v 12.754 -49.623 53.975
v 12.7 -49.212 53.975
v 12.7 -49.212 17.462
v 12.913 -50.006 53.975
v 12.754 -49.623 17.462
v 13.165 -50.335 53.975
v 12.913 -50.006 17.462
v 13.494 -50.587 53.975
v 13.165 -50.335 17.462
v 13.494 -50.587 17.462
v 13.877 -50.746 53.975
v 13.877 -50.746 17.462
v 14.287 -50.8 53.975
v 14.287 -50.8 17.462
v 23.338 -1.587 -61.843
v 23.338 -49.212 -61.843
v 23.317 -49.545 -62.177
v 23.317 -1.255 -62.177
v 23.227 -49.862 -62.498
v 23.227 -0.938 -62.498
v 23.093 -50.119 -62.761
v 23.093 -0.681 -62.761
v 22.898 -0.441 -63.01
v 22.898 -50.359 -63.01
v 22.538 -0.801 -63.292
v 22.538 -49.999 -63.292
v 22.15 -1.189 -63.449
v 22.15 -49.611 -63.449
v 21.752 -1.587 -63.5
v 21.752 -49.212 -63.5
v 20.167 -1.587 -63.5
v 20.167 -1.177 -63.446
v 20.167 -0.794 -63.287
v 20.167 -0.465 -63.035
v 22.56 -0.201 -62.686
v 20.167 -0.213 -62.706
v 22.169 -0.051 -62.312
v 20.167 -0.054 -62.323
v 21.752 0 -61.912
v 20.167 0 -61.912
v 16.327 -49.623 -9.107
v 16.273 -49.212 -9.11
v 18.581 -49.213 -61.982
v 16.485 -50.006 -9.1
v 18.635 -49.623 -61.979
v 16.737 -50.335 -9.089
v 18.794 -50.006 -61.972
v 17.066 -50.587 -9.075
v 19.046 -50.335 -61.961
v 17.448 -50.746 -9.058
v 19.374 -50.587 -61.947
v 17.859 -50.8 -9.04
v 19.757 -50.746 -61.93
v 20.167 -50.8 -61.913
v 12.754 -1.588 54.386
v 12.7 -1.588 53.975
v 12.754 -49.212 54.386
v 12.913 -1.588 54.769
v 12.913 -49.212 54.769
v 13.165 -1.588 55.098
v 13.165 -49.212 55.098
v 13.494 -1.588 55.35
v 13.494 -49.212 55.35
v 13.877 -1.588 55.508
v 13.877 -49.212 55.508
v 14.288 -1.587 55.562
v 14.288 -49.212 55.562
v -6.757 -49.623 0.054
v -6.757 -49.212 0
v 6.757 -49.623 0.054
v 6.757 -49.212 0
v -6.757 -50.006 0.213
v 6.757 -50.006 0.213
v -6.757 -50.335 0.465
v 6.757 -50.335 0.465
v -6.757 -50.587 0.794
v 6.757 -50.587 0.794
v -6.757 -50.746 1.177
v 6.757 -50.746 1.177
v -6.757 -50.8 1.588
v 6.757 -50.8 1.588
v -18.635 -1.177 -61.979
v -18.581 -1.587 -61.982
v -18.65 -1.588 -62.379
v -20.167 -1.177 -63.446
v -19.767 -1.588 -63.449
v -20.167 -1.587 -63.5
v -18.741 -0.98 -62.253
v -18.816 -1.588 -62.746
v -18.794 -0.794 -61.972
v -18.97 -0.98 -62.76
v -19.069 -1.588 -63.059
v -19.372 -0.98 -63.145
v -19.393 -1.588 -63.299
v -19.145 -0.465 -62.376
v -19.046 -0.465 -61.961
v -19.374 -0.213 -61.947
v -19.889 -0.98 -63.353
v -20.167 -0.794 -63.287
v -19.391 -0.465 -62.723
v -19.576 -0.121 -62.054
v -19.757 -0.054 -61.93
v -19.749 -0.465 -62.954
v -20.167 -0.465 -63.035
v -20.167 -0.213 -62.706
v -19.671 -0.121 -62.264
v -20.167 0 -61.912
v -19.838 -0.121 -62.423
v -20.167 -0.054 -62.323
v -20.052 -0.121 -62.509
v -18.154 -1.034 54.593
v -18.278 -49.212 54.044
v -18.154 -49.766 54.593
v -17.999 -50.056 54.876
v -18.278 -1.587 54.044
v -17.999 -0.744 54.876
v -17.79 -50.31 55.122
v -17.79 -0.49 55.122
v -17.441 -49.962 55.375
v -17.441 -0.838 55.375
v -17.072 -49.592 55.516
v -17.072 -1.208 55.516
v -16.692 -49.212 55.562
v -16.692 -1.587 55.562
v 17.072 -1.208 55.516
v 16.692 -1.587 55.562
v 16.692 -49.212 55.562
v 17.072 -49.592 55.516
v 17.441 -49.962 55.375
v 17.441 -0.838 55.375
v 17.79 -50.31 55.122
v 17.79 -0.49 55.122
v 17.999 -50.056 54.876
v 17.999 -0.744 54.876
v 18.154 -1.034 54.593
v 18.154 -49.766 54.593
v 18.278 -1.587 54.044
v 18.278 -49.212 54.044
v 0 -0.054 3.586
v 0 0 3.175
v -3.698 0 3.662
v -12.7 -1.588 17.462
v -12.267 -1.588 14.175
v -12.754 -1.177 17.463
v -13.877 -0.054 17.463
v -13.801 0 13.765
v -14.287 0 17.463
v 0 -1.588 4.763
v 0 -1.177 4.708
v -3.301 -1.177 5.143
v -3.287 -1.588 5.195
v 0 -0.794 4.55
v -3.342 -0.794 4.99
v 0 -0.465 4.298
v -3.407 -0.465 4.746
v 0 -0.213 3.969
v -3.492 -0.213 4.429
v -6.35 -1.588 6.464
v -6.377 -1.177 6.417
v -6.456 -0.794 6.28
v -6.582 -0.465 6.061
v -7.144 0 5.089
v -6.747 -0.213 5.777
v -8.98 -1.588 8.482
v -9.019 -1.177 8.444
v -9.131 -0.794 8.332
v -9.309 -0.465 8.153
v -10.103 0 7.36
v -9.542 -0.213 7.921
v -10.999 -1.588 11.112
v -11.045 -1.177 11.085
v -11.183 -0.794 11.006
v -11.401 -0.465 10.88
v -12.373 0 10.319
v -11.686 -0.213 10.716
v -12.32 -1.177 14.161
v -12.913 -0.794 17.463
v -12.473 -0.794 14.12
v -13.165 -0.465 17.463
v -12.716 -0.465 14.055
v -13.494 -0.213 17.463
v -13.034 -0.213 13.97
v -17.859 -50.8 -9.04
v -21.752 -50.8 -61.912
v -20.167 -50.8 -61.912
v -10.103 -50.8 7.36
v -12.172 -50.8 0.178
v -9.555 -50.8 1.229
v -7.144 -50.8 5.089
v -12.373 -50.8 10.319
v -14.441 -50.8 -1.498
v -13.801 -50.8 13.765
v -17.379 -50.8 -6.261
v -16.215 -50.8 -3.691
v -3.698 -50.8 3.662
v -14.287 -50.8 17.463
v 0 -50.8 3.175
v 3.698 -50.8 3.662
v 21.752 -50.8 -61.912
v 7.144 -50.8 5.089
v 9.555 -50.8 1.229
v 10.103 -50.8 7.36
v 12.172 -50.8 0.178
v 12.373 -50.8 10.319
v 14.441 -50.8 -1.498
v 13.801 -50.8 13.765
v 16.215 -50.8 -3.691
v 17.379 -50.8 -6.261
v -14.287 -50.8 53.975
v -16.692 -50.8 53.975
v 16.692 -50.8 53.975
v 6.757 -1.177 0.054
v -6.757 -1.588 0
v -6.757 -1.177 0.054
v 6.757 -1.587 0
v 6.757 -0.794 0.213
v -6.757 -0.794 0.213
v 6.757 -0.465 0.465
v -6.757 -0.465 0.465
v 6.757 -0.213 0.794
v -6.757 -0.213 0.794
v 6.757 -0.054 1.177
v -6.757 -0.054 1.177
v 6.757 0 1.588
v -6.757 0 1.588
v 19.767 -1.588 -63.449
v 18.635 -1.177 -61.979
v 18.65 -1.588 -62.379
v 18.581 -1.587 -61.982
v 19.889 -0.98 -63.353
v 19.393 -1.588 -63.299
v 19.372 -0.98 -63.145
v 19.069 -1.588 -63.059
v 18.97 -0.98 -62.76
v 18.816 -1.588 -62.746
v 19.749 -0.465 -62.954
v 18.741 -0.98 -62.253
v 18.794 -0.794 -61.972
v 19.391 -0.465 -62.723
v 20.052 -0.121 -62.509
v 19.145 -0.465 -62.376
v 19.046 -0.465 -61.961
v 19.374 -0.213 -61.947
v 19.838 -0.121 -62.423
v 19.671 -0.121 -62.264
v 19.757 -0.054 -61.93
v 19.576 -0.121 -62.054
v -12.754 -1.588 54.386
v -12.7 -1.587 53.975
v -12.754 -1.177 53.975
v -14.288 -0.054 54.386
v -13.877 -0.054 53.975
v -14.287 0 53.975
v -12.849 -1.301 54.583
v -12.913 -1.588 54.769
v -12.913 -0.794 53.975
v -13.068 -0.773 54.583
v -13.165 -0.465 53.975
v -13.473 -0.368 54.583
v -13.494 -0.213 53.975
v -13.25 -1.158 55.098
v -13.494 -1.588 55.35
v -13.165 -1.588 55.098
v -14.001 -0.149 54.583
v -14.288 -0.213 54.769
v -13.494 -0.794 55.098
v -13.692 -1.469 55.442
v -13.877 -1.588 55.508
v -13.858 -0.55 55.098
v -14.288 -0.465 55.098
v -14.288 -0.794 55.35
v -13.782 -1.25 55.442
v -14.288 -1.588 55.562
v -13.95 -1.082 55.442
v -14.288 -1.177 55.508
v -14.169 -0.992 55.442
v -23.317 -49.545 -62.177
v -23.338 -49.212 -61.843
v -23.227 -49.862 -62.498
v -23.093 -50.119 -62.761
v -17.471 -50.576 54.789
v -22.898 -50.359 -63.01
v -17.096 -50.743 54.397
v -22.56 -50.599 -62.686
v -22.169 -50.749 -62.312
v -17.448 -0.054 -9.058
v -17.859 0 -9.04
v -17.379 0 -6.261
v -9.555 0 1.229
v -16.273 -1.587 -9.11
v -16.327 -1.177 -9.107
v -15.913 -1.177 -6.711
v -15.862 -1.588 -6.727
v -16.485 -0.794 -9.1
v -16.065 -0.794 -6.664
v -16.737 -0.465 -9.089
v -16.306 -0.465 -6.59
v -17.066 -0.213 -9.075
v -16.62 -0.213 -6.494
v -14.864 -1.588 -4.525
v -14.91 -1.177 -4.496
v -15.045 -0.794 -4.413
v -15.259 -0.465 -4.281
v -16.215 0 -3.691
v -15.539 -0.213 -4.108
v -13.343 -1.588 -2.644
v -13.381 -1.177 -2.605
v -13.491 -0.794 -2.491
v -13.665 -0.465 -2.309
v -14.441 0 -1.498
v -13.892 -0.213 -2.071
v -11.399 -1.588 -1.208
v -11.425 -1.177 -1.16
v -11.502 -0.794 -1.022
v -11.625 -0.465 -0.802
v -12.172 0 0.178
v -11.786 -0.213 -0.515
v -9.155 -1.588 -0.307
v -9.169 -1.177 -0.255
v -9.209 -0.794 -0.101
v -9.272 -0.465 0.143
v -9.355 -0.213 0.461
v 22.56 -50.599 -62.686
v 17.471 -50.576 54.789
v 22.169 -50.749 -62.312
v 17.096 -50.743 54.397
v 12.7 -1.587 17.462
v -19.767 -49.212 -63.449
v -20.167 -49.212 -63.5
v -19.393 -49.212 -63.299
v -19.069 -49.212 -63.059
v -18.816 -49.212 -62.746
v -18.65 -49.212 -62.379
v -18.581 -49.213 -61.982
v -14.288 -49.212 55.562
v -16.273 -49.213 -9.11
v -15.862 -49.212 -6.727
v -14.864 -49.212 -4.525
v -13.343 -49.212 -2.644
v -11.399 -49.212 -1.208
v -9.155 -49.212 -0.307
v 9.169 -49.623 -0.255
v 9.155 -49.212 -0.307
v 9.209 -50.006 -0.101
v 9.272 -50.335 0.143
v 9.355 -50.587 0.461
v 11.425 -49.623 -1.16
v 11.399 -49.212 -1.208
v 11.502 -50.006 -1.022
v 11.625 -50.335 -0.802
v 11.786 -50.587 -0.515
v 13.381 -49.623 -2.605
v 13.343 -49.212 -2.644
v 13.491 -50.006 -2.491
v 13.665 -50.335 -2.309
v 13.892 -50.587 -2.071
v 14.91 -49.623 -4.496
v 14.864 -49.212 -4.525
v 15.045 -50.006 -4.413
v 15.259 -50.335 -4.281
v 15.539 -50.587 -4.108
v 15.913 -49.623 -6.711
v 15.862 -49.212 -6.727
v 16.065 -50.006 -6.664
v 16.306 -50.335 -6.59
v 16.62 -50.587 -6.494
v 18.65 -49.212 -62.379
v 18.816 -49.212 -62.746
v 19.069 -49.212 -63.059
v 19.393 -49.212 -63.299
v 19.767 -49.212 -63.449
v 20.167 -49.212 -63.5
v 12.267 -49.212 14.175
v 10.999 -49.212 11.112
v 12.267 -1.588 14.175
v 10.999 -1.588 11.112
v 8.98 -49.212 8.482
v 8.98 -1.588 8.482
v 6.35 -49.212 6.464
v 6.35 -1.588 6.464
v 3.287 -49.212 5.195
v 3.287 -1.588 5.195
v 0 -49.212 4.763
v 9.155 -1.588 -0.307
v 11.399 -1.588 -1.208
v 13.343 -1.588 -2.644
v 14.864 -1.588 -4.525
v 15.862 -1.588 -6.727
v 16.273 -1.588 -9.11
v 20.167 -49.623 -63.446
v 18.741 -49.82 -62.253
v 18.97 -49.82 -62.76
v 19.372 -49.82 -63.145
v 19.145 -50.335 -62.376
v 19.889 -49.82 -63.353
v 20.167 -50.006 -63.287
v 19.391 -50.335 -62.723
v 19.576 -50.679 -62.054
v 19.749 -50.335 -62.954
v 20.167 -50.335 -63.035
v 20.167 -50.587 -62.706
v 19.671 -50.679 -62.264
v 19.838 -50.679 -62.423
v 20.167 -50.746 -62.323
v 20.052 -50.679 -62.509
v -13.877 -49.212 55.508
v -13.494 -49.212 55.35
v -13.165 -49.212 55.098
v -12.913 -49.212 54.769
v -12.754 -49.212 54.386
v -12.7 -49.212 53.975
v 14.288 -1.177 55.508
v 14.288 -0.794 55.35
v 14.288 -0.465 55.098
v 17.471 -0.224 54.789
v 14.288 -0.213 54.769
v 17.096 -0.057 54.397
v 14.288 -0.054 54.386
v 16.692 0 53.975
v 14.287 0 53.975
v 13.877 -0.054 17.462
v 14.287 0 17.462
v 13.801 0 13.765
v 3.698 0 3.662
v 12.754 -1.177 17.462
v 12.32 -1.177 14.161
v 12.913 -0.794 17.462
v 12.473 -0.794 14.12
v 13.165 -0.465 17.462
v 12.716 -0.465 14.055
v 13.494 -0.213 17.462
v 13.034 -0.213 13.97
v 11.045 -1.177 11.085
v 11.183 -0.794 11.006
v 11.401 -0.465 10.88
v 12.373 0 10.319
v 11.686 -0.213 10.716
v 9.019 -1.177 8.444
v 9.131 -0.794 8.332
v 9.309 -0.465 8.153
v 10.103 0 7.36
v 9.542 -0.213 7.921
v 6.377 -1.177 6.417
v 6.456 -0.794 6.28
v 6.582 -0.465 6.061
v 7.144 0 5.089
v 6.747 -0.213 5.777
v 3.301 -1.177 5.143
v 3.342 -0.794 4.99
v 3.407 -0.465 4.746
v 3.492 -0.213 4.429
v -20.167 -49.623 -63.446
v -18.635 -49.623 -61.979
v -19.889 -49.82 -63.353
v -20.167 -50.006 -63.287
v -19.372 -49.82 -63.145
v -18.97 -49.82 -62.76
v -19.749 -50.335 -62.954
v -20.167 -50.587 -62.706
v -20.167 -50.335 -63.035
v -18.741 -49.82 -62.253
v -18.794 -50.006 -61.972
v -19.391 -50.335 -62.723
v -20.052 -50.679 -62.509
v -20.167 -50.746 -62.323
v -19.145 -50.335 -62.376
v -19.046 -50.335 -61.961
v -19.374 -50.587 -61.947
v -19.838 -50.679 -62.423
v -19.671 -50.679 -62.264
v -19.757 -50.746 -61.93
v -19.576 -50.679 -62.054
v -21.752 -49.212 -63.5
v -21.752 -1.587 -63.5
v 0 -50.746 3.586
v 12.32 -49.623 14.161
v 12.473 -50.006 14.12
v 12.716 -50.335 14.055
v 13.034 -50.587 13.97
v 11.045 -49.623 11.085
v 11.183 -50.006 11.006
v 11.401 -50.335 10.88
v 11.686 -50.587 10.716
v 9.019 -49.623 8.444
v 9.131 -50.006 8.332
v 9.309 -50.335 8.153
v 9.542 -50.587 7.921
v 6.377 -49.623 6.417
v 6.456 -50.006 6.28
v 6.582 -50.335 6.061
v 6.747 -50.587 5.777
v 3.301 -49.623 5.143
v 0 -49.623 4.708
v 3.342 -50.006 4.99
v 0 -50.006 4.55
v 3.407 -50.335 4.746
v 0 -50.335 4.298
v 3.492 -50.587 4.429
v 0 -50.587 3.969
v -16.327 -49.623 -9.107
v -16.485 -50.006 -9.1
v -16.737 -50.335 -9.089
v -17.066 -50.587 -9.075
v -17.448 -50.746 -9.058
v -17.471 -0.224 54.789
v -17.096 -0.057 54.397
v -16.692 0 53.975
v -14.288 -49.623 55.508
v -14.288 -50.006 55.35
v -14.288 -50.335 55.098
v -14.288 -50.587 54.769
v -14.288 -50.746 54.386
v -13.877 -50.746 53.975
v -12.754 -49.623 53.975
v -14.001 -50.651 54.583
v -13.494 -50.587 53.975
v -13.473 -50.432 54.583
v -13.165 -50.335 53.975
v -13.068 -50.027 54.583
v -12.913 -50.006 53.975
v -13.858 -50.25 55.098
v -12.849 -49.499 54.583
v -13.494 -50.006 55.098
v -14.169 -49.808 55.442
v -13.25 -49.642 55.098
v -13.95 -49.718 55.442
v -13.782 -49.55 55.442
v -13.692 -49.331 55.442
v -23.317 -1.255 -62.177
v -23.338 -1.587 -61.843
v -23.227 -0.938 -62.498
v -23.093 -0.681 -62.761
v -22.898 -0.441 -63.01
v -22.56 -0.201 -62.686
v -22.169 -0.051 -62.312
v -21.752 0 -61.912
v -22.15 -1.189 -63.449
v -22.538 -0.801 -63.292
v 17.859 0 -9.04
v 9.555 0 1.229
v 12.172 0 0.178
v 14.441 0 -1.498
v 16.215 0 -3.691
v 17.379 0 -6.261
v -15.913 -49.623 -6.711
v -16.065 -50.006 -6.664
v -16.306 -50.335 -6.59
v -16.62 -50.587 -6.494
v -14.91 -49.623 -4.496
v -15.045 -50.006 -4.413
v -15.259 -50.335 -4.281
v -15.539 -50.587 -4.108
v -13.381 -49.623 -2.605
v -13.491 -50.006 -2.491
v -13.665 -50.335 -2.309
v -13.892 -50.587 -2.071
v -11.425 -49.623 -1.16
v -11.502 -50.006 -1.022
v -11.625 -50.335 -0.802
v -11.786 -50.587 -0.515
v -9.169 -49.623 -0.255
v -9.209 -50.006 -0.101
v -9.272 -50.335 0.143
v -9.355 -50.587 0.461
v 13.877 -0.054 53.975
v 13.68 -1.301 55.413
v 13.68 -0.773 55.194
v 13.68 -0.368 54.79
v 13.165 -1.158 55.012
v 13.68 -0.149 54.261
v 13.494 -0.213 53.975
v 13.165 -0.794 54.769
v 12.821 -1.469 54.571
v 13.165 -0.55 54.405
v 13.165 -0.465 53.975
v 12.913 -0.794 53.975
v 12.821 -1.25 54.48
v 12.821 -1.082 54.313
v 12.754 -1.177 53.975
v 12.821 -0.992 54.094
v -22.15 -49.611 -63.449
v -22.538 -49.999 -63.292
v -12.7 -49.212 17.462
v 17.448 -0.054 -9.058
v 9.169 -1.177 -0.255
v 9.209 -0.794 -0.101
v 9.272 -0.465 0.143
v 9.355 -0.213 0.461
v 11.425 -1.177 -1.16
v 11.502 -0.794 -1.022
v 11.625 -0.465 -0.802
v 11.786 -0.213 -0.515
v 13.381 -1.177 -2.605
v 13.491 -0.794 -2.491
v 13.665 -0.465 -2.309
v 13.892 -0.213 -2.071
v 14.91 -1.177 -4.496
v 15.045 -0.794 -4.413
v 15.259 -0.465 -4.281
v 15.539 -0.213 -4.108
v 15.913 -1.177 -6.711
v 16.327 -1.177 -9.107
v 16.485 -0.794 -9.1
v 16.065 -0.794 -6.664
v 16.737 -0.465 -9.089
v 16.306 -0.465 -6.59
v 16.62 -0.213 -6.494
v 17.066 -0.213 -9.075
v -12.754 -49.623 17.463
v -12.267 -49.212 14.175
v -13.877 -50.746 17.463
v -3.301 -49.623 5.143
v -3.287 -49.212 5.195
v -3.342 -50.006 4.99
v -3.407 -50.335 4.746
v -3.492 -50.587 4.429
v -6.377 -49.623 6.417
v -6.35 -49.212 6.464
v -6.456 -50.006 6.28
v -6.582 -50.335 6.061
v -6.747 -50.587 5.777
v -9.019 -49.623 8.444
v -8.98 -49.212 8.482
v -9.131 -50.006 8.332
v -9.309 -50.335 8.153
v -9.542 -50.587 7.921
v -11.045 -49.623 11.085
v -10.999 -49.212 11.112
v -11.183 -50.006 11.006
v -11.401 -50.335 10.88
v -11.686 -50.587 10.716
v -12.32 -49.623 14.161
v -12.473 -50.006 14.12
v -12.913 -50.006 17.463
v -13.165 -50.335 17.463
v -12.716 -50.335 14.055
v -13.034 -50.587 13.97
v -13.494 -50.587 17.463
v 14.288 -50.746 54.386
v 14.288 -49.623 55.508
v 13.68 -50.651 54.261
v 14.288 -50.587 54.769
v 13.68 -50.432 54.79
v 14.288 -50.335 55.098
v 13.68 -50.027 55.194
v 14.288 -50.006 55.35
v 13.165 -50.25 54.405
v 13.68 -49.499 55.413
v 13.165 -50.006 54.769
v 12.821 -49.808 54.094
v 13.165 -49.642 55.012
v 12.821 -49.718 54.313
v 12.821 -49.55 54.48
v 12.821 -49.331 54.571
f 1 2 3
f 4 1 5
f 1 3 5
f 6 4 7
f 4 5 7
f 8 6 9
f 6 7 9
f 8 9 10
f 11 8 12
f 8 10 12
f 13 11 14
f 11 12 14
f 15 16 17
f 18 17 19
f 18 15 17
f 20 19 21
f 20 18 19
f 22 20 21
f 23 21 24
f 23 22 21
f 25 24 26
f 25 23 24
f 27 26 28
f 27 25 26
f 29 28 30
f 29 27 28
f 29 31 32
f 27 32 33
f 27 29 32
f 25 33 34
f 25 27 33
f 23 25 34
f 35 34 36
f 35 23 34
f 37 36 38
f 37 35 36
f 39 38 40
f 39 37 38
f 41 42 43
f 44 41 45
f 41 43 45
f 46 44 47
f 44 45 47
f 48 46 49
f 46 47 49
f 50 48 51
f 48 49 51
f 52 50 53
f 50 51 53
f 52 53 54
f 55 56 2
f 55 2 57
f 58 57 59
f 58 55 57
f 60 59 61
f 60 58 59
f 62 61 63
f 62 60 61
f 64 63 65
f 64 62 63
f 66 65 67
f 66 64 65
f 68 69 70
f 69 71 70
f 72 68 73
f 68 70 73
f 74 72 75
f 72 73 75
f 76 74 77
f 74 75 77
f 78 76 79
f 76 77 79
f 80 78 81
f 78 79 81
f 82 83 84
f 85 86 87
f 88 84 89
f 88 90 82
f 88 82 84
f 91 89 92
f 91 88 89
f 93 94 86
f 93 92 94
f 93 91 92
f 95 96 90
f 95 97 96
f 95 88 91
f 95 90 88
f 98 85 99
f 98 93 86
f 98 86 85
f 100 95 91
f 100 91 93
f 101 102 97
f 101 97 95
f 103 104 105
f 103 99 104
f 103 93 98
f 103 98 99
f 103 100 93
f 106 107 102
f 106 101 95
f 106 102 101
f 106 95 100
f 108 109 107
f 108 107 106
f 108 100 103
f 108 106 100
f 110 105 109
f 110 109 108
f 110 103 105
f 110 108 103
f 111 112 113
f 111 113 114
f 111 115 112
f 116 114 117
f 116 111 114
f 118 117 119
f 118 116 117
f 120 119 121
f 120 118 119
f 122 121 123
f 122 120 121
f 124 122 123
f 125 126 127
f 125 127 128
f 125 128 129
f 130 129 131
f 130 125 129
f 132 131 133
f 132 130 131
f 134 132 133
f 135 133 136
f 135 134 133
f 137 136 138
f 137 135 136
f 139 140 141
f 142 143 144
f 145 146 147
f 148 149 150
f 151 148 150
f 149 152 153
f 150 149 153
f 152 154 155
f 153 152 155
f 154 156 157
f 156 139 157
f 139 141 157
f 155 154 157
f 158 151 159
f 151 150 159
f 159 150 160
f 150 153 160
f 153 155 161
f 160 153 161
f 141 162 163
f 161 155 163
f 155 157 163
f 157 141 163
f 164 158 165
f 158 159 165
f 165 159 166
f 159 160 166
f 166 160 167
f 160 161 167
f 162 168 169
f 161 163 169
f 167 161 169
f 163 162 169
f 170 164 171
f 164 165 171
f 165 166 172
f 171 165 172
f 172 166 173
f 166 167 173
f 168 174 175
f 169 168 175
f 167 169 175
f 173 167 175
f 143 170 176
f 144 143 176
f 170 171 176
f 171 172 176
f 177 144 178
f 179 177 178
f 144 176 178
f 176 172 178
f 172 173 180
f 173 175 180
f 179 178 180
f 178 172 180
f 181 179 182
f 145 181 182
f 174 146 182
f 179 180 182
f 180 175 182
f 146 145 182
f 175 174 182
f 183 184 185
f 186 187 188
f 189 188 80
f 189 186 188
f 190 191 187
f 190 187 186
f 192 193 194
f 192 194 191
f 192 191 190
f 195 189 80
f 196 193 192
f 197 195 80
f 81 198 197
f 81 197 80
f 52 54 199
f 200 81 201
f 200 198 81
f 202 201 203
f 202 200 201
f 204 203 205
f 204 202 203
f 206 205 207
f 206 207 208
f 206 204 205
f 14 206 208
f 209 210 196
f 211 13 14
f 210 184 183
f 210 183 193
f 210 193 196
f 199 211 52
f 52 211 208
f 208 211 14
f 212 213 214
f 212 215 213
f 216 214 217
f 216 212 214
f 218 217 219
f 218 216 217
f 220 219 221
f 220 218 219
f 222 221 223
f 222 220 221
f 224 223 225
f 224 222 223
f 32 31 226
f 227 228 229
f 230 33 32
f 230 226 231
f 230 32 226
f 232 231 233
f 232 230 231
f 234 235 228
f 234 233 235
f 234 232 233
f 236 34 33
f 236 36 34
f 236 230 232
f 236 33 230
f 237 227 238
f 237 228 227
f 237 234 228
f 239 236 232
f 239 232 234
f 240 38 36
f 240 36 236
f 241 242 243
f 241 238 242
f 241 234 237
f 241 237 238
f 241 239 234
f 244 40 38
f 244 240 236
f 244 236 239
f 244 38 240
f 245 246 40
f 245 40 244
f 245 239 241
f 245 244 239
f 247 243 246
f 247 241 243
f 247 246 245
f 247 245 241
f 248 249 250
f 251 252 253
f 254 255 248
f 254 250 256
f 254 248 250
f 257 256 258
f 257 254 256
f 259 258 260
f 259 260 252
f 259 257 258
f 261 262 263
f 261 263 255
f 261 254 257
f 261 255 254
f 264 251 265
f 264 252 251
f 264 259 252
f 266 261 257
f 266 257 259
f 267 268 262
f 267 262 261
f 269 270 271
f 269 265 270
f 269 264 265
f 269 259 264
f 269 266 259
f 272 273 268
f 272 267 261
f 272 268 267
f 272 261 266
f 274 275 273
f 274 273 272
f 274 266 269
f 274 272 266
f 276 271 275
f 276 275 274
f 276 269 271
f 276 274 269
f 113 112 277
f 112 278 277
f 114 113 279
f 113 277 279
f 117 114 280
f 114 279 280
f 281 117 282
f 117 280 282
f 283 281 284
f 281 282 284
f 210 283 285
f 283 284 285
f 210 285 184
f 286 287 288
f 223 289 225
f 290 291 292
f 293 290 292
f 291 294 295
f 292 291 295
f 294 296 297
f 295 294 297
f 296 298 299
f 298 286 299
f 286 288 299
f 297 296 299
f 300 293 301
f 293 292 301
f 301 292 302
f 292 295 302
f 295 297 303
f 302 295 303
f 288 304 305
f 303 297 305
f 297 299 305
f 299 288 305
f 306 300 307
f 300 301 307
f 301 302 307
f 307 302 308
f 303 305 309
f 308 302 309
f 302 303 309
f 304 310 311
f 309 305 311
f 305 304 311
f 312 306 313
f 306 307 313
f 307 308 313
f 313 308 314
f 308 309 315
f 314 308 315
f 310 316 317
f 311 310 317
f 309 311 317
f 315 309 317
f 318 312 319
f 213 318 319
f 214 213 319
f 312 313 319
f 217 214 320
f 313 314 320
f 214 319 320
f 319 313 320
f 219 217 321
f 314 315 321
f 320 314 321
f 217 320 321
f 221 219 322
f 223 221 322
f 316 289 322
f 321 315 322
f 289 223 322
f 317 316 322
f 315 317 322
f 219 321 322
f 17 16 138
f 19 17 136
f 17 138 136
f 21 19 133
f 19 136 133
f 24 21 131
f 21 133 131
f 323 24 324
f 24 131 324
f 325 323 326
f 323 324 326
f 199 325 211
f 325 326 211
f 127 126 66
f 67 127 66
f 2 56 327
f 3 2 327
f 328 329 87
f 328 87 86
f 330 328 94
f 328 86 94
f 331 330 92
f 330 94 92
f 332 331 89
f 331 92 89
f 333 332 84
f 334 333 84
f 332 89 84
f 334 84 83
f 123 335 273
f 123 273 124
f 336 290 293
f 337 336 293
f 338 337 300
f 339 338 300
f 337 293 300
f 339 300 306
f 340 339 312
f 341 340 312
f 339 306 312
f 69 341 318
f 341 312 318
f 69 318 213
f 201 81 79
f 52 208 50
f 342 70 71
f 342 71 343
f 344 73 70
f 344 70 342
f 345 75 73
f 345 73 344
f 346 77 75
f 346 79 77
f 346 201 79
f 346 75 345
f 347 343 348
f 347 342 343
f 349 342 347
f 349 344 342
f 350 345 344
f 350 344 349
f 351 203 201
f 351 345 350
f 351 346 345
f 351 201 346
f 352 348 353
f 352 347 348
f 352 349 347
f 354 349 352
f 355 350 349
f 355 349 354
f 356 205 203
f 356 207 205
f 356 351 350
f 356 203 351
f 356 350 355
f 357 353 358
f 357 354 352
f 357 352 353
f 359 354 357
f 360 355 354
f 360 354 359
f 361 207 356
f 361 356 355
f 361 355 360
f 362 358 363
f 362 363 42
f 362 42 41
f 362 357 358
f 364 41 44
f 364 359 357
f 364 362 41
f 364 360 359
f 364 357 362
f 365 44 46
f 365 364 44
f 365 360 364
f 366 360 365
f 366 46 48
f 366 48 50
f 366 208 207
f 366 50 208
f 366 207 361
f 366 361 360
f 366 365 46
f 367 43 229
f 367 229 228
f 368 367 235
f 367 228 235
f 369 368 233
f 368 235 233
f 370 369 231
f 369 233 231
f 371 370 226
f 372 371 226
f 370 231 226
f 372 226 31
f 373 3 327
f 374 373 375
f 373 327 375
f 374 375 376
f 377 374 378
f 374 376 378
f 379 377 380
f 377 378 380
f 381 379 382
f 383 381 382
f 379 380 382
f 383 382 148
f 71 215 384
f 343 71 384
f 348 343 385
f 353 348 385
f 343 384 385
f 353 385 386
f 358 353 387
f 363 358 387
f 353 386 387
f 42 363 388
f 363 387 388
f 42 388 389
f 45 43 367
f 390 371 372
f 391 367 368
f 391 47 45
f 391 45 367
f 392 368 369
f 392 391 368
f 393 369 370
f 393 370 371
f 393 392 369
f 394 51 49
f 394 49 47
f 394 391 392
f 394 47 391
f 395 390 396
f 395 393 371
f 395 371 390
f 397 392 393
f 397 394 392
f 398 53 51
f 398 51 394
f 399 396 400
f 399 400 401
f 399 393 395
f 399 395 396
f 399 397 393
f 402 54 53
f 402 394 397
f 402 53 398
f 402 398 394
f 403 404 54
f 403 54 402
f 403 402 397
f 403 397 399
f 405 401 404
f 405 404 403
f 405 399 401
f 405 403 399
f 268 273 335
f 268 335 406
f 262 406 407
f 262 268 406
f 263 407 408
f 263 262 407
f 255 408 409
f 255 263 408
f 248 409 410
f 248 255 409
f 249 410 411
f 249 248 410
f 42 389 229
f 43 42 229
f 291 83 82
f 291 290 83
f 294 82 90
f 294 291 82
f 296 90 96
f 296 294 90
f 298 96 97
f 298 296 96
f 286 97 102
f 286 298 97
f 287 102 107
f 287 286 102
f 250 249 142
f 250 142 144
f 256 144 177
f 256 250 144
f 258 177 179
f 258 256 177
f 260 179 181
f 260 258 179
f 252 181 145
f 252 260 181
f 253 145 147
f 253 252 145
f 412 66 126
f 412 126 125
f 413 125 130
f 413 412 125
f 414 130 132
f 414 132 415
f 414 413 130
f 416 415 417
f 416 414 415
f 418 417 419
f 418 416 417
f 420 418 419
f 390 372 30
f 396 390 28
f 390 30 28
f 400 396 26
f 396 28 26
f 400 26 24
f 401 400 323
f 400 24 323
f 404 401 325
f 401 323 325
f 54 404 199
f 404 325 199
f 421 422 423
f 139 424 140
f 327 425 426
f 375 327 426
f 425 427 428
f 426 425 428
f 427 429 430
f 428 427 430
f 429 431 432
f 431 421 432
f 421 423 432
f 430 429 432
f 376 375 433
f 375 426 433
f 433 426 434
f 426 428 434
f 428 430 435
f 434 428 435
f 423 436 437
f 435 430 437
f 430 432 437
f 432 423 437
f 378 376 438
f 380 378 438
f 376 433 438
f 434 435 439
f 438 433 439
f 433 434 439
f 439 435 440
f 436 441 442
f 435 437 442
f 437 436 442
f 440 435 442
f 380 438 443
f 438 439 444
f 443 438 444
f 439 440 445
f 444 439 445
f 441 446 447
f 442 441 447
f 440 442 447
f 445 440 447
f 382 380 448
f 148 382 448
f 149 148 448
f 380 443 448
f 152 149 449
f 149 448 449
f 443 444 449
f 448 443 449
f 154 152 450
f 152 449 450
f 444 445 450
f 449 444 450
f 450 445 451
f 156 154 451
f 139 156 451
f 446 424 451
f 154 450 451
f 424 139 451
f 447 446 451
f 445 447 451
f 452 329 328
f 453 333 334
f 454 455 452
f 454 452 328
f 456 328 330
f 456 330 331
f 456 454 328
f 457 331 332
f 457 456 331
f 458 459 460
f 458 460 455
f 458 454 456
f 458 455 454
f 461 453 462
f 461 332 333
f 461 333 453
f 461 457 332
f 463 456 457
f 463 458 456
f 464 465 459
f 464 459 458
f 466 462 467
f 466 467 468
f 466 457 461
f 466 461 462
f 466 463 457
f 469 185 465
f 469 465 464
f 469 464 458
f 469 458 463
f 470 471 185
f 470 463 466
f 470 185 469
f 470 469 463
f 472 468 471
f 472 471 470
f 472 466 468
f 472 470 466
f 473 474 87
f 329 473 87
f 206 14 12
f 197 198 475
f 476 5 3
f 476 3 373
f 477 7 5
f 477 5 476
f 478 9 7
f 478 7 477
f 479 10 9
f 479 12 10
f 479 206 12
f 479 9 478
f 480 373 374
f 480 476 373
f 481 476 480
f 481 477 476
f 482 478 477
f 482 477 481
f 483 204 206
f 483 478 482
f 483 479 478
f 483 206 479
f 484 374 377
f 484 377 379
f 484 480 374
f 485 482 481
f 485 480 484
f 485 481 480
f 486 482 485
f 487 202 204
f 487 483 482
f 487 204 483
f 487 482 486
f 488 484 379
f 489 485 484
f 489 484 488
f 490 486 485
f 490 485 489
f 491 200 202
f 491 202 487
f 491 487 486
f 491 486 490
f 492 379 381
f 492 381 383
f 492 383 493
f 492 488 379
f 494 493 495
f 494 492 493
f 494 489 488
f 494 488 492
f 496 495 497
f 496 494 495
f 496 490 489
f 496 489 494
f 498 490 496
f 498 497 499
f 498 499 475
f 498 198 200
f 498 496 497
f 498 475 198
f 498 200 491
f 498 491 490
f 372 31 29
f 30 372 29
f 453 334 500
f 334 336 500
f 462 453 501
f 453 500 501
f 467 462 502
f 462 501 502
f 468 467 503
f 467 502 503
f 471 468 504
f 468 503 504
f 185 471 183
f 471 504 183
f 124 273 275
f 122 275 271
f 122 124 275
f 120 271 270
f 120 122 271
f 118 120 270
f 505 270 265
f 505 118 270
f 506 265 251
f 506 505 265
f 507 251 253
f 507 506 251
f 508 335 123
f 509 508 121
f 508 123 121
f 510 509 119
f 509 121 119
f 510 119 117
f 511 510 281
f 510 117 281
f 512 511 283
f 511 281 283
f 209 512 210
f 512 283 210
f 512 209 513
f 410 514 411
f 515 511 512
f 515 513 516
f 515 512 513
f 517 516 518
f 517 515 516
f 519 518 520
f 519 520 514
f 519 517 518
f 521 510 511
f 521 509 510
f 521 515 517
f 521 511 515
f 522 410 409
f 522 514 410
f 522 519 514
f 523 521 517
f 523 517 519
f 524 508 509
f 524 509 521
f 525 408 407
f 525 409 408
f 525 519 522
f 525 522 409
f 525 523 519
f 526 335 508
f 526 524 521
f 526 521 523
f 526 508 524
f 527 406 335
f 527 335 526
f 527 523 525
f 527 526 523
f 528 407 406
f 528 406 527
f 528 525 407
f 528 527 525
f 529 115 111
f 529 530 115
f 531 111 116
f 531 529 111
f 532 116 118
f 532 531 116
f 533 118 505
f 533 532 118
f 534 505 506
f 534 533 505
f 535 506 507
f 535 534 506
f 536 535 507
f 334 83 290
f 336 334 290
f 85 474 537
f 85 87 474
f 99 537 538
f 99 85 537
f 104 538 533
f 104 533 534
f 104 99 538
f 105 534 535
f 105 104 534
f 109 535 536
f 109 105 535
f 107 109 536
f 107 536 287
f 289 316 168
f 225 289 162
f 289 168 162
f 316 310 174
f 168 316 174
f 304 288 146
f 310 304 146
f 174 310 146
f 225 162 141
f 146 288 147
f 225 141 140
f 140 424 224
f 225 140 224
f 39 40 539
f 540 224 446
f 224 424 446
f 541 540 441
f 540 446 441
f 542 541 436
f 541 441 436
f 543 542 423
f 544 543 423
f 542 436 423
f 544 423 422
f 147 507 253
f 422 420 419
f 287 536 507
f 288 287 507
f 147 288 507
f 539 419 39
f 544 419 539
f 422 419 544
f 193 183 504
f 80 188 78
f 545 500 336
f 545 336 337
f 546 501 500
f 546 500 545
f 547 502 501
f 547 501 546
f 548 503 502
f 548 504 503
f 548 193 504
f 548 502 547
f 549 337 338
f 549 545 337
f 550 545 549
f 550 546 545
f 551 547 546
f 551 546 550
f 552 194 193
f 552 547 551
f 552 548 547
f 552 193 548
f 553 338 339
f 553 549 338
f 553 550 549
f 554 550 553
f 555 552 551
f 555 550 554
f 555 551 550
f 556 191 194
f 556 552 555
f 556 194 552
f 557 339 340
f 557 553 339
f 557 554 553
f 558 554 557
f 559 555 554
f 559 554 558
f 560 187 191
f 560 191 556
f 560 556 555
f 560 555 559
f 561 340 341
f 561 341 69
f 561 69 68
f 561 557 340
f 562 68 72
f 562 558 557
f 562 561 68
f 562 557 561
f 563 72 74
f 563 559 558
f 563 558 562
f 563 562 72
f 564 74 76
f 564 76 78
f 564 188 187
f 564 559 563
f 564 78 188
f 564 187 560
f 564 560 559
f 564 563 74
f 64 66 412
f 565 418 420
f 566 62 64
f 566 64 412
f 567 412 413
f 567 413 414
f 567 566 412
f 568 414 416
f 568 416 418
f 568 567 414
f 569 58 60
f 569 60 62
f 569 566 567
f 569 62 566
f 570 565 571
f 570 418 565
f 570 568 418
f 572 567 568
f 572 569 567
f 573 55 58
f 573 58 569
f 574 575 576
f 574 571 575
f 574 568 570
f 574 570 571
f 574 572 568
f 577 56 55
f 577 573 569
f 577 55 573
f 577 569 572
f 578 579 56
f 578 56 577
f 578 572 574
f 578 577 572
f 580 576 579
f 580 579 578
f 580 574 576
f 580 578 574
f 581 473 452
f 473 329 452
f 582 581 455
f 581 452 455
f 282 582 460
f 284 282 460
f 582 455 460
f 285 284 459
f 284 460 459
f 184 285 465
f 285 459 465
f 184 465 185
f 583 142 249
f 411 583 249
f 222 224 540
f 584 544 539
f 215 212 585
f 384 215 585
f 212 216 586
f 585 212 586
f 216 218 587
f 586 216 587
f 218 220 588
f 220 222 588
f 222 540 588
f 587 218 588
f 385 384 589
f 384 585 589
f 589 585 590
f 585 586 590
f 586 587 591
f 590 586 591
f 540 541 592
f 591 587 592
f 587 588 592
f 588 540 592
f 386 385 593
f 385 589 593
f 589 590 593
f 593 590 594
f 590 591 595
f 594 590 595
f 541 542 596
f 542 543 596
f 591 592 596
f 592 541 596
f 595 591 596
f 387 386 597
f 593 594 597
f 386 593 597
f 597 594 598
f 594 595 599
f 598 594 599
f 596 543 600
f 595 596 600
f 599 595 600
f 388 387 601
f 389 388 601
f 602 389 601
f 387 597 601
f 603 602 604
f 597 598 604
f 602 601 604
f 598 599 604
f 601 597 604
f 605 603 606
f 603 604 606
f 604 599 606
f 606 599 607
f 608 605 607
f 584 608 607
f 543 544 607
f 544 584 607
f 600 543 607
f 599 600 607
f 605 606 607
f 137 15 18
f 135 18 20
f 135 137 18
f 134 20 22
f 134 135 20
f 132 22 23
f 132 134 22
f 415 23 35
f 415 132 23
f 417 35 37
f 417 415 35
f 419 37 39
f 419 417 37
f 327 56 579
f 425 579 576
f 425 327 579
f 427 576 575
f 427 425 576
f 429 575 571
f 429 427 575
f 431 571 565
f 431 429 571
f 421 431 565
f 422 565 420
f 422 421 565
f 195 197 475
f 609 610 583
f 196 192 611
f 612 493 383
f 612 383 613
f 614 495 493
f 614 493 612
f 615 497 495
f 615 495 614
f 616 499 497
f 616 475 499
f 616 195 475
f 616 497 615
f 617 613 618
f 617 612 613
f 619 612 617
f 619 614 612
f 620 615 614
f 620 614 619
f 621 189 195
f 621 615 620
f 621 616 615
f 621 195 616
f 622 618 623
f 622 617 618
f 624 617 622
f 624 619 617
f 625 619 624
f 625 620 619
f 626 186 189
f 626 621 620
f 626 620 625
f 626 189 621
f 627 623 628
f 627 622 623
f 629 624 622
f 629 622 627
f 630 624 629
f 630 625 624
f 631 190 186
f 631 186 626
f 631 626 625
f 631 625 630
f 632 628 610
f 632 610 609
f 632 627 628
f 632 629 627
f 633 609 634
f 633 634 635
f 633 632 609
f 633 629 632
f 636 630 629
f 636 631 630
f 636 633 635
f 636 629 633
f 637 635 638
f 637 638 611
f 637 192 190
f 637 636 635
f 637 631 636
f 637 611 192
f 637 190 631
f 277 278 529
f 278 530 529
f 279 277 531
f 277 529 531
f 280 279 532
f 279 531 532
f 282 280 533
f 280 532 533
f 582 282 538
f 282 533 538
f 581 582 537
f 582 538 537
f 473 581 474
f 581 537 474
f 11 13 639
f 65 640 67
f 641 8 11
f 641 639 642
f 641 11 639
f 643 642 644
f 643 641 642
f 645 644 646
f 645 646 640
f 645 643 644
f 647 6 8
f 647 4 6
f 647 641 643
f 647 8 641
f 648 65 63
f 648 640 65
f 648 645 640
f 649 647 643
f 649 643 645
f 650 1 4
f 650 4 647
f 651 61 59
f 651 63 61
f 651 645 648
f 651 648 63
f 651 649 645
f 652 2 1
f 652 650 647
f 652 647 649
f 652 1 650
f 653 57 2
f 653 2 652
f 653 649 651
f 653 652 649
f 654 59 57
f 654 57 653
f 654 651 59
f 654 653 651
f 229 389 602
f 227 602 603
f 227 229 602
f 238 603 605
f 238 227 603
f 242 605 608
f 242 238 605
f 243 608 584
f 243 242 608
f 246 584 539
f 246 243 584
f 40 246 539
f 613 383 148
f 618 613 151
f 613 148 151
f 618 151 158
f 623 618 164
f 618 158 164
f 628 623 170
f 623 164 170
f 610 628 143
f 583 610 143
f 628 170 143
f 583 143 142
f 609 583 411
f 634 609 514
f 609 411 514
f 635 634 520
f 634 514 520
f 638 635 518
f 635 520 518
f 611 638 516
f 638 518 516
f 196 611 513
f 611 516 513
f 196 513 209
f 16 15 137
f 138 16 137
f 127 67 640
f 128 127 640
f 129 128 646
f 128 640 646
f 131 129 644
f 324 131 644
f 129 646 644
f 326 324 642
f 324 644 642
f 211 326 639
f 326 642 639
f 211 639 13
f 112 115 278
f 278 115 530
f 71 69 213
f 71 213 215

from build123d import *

# Parameters (mm, degrees)
F1_DEPTH     = 50.8
F2_R         = 1.5875
F3_T1_DEPTH  = 55.2235032041
F3_T3_DEPTH  = 55.9166206728
F4_T1_DEPTH  = 47.625
F4_T6_DEPTH  = 1.5875
F4_T12_DEPTH = 1.5875
F4_T18_DEPTH = 1.5875
F4_T24_DEPTH = 1.5875
F4_S29_W     = 1.5875
F4_S29_H     = 1.5875
F4_T30_DEPTH = 1.5875
F4_S35_W     = 1.5875
F4_S35_H     = 1.5875
F4_T36_DEPTH = 1.5875
F4_S41_W     = 1.5875
F4_S41_H     = 1.5875
F4_T42_DEPTH = 1.5875
F4_S47_W     = 1.5875
F4_S47_H     = 1.5875
F4_T48_DEPTH = 1.5875


# Not quite as in the source:
# - a fillet or chamfer that OpenCascade refuses, or shapes differently, is made with other operations: its cross-section is extruded or revolved along the edge and cut away or added


with BuildPart() as f1:
    # F0 (on Front) → F1 (new body)
    with BuildSketch(Plane.XZ):
        with BuildLine():
            Line((-18.2115888596, 55.5625), (-23.4099698747, -63.5))
            Line((-23.4099698747, -63.5), (-18.6474698747, -63.5))
            Line((-18.6474698747, -63.5), (-16.2727304656, -9.1095253353))
            ThreePointArc((-16.2727304656, -9.1095253353), (-13.3434580113, -2.6444832614), (-6.756796155, 0))
            Line((-6.756796155, 0), (0, 0))
            Line((0, 0), (0, 4.7625))
            ThreePointArc((0, 4.7625), (-8.9802561211, 8.4822438789), (-12.7, 17.4625))
            Line((-12.7, 17.4625), (-12.7, 55.5625))
            Line((-12.7, 55.5625), (-18.2115888596, 55.5625))
        make_face()
        with BuildLine():
            Line((0, 4.7625), (0, 0))
            Line((0, 0), (6.756796155, 0))
            ThreePointArc((6.756796155, 0), (13.3434580113, -2.6444832614), (16.2727304656, -9.1095253353))
            Line((16.2727304656, -9.1095253353), (18.6474698747, -63.5))
            Line((18.6474698747, -63.5), (23.4099698747, -63.5))
            Line((23.4099698747, -63.5), (18.2115888596, 55.5625))
            Line((18.2115888596, 55.5625), (12.7, 55.5625))
            Line((12.7, 55.5625), (12.7, 17.4625))
            ThreePointArc((12.7, 17.4625), (8.9802561211, 8.4822438789), (0, 4.7625))
        make_face()
    extrude(amount=F1_DEPTH)

    # F2
    f2_edges = [f1.edges().sort_by_distance(p)[0] for p in [
        (-20.810779, -50.8, -3.96875),
        (-21.02872, -50.8, -63.5),
        (-17.4601, -50.8, -36.304763),
        (-13.343458, -50.8, -2.644483),
        (0, -50.8, 0),
        (13.343458, -50.8, -2.644483),
        (17.4601, -50.8, -36.304763),
        (21.02872, -50.8, -63.5),
        (20.810779, -50.8, -3.96875),
        (15.455794, -50.8, 55.5625),
        (12.7, -50.8, 36.5125),
        (0, -50.8, 4.7625),
        (-12.7, -50.8, 36.5125),
        (-15.455794, -50.8, 55.5625),
        (-20.810779, 0, -3.96875),
        (-21.02872, 0, -63.5),
        (-17.4601, 0, -36.304763),
        (-13.343458, 0, -2.644483),
        (0, 0, 0),
        (13.343458, 0, -2.644483),
        (17.4601, 0, -36.304763),
        (21.02872, 0, -63.5),
        (20.810779, 0, -3.96875),
        (15.455794, 0, 55.5625),
        (12.7, 0, 36.5125),
        (0, 0, 4.7625),
        (-12.7, 0, 36.5125),
        (-15.455794, 0, 55.5625),
    ]]
    fillet(f2_edges, radius=F2_R)

    # F3: fillet of radius 1.5875 on 8 edges, made by hand

    # F3_s2 → F3_t1 (cut)
    with BuildSketch(Plane.XZ.offset(-2.2117516021)):
        with BuildLine():
            ThreePointArc((-18.2778772706, 54.0442457774), (-17.7896651949, 55.1217527898), (-16.6918882188, 55.5625))
            Line((-16.6918882188, 55.5625), (-18.2115888596, 55.5625))
            Line((-18.2115888596, 55.5625), (-18.2778772706, 54.0442457774))
        make_face()
        with BuildLine():
            ThreePointArc((16.6918882188, 55.5625), (17.7896651949, 55.1217527898), (18.2778772706, 54.0442457774))
            Line((18.2778772706, 54.0442457774), (18.2115888596, 55.5625))
            Line((18.2115888596, 55.5625), (16.6918882188, 55.5625))
        make_face()
    extrude(amount=F3_T1_DEPTH, mode=Mode.SUBTRACT)

    # F3_s4 → F3_t3 (cut)
    with BuildSketch(Plane.XZ.offset(-2.5583103364)):
        with BuildLine():
            ThreePointArc((-23.3376347919, -61.8432542226), (-22.8983985299, -63.0102769761), (-21.7516457401, -63.5))
            Line((-21.7516457401, -63.5), (-23.4099698747, -63.5))
            Line((-23.4099698747, -63.5), (-23.3376347919, -61.8432542226))
        make_face()
        with BuildLine():
            ThreePointArc((23.3376347919, -61.8432542226), (22.8983985299, -63.0102769761), (21.7516457401, -63.5))
            Line((21.7516457401, -63.5), (23.4099698747, -63.5))
            Line((23.4099698747, -63.5), (23.3376347919, -61.8432542226))
        make_face()
    extrude(amount=F3_T3_DEPTH, mode=Mode.SUBTRACT)

    # F4: fillet of radius 1.5875 on 4 edges, made by hand

    # F4_s2 → F4_t1 (cut)
    with BuildSketch(Plane.XZ.offset(1.5875)):
        with BuildLine():
            ThreePointArc((-14.2875, 55.5625), (-13.1649679849, 55.0975320151), (-12.7, 53.975))
            Line((-12.7, 53.975), (-12.7, 55.5625))
            Line((-12.7, 55.5625), (-14.2875, 55.5625))
        make_face()
        with BuildLine():
            ThreePointArc((12.7, 53.975), (13.1649679849, 55.0975320151), (14.2875, 55.5625))
            Line((14.2875, 55.5625), (12.7, 55.5625))
            Line((12.7, 55.5625), (12.7, 53.975))
        make_face()
        with BuildLine():
            ThreePointArc((-20.1671705155, -63.5), (-19.0693935395, -63.0592527898), (-18.5811814638, -61.9817457774))
            Line((-18.5811814638, -61.9817457774), (-18.6474698747, -63.5))
            Line((-18.6474698747, -63.5), (-20.1671705155, -63.5))
        make_face()
        with BuildLine():
            ThreePointArc((18.5811814638, -61.9817457774), (19.0693935395, -63.0592527898), (20.1671705155, -63.5))
            Line((20.1671705155, -63.5), (18.6474698747, -63.5))
            Line((18.6474698747, -63.5), (18.5811814638, -61.9817457774))
        make_face()
    extrude(amount=F4_T1_DEPTH, mode=Mode.SUBTRACT)


with BuildPart() as f4_tool4:
    # F4_s5 → F4_t6 (new body)
    with BuildSketch(Plane.XZ.offset(1.5875)):
        Polygon((20.1671705155, -61.9125), (18.5811814638, -61.9817457774), (18.6474698747, -63.5), (20.1671705155, -63.5), align=None)
    extrude(amount=-F4_T6_DEPTH)

    # F4_s7 → F4_t8 (revolve, cut)
    with BuildSketch(Plane(origin=(20.1671705155, -1.5875, -61.9125), x_dir=(0.6915130558, 0, 0.7223639621), z_dir=(-0.7223639621, 0, 0.6915130558))):
        with BuildLine():
            ThreePointArc((0, -1.5875), (1.5875, 0), (0, 1.5875))
            Line((0, 1.5875), (0, -1.5875))
        make_face()
    revolve(axis=Axis((20.1671705155, -1.5875, -61.9125), (0, 1, 0)), mode=Mode.SUBTRACT)


with BuildPart() as f1_1:
    add(f1.part)

    # F4_t3: cut F4_tool4
    add(f4_tool4.part, mode=Mode.SUBTRACT)


with BuildPart() as f4_tool10:
    # F4_s11 → F4_t12 (new body)
    with BuildSketch(Plane.XZ.offset(49.2125)):
        Polygon((20.1671705155, -61.9125), (18.5811814638, -61.9817457774), (18.6474698747, -63.5), (20.1671705155, -63.5), align=None)
    extrude(amount=F4_T12_DEPTH)

    # F4_s13 → F4_t14 (revolve, cut)
    with BuildSketch(Plane(origin=(20.1671705155, -49.2125, -61.9125), x_dir=(0.6915130558, 0, 0.7223639621), z_dir=(0.7223639621, 0, -0.6915130558))):
        with BuildLine():
            ThreePointArc((0, -1.5875), (1.5875, 0), (0, 1.5875))
            Line((0, 1.5875), (0, -1.5875))
        make_face()
    revolve(axis=Axis((20.1671705155, -49.2125, -61.9125), (0, -1, 0)), mode=Mode.SUBTRACT)


with BuildPart() as f1_2:
    add(f1_1.part)

    # F4_t9: cut F4_tool10
    add(f4_tool10.part, mode=Mode.SUBTRACT)


with BuildPart() as f4_tool16:
    # F4_s17 → F4_t18 (new body)
    with BuildSketch(Plane.XZ.offset(1.5875)):
        Polygon((-20.1671705155, -61.9125), (-20.1671705155, -63.5), (-18.6474698747, -63.5), (-18.5811814638, -61.9817457774), align=None)
    extrude(amount=-F4_T18_DEPTH)

    # F4_s19 → F4_t20 (revolve, cut)
    with BuildSketch(Plane(origin=(-20.1671705155, -1.5875, -61.9125), x_dir=(-0.6915130558, 0, 0.7223639621), z_dir=(-0.7223639621, 0, -0.6915130558))):
        with BuildLine():
            ThreePointArc((0, -1.5875), (1.5875, 0), (0, 1.5875))
            Line((0, 1.5875), (0, -1.5875))
        make_face()
    revolve(axis=Axis((-20.1671705155, -1.5875, -61.9125), (0, 1, 0)), mode=Mode.SUBTRACT)


with BuildPart() as f1_3:
    add(f1_2.part)

    # F4_t15: cut F4_tool16
    add(f4_tool16.part, mode=Mode.SUBTRACT)


with BuildPart() as f4_tool22:
    # F4_s23 → F4_t24 (new body)
    with BuildSketch(Plane.XZ.offset(49.2125)):
        Polygon((-20.1671705155, -61.9125), (-20.1671705155, -63.5), (-18.6474698747, -63.5), (-18.5811814638, -61.9817457774), align=None)
    extrude(amount=F4_T24_DEPTH)

    # F4_s25 → F4_t26 (revolve, cut)
    with BuildSketch(Plane(origin=(-20.1671705155, -49.2125, -61.9125), x_dir=(-0.6915130558, 0, 0.7223639621), z_dir=(0.7223639621, 0, 0.6915130558))):
        with BuildLine():
            ThreePointArc((0, -1.5875), (1.5875, 0), (0, 1.5875))
            Line((0, 1.5875), (0, -1.5875))
        make_face()
    revolve(axis=Axis((-20.1671705155, -49.2125, -61.9125), (0, -1, 0)), mode=Mode.SUBTRACT)


with BuildPart() as f1_4:
    add(f1_3.part)

    # F4_t21: cut F4_tool22
    add(f4_tool22.part, mode=Mode.SUBTRACT)


with BuildPart() as f4_tool28:
    # F4_s29 → F4_t30 (new body)
    with BuildSketch(Plane.YZ.offset(14.2875)):
        with Locations((-0.79375, 54.76875)):
            Rectangle(F4_S29_W, F4_S29_H)
    extrude(amount=-F4_T30_DEPTH)

    # F4_s31 → F4_t32 (revolve, cut)
    with BuildSketch(Plane(origin=(14.2875, -1.5875, 53.975), x_dir=(0, -0.7071067812, -0.7071067812), z_dir=(0, 0.7071067812, -0.7071067812))):
        with BuildLine():
            ThreePointArc((0, -1.5875), (1.5875, 0), (0, 1.5875))
            Line((0, 1.5875), (0, -1.5875))
        make_face()
    revolve(axis=Axis((14.2875, -1.5875, 53.975), (-1, 0, 0)), mode=Mode.SUBTRACT)


with BuildPart() as f1_5:
    add(f1_4.part)

    # F4_t27: cut F4_tool28
    add(f4_tool28.part, mode=Mode.SUBTRACT)


with BuildPart() as f4_tool34:
    # F4_s35 → F4_t36 (new body)
    with BuildSketch(Plane.YZ.offset(14.2875)):
        with Locations((-50.00625, 54.76875)):
            Rectangle(F4_S35_W, F4_S35_H)
    extrude(amount=-F4_T36_DEPTH)

    # F4_s37 → F4_t38 (revolve, cut)
    with BuildSketch(Plane(origin=(14.2875, -49.2125, 53.975), x_dir=(0, 0.7071067812, -0.7071067812), z_dir=(0, 0.7071067812, 0.7071067812))):
        with BuildLine():
            ThreePointArc((0, -1.5875), (1.5875, 0), (0, 1.5875))
            Line((0, 1.5875), (0, -1.5875))
        make_face()
    revolve(axis=Axis((14.2875, -49.2125, 53.975), (-1, 0, 0)), mode=Mode.SUBTRACT)


with BuildPart() as f1_6:
    add(f1_5.part)

    # F4_t33: cut F4_tool34
    add(f4_tool34.part, mode=Mode.SUBTRACT)


with BuildPart() as f4_tool40:
    # F4_s41 → F4_t42 (new body)
    with BuildSketch(Plane.XY.offset(53.975)):
        with Locations((-13.49375, -0.79375)):
            Rectangle(F4_S41_W, F4_S41_H)
    extrude(amount=F4_T42_DEPTH)

    # F4_s43 → F4_t44 (revolve, cut)
    with BuildSketch(Plane(origin=(-14.2875, -1.5875, 53.975), x_dir=(-0.7071067812, -0.7071067812, 0), z_dir=(-0.7071067812, 0.7071067812, 0))):
        with BuildLine():
            ThreePointArc((0, -1.5875), (1.5875, 0), (0, 1.5875))
            Line((0, 1.5875), (0, -1.5875))
        make_face()
    revolve(axis=Axis((-14.2875, -1.5875, 53.975), (0, 0, 1)), mode=Mode.SUBTRACT)


with BuildPart() as f1_7:
    add(f1_6.part)

    # F4_t39: cut F4_tool40
    add(f4_tool40.part, mode=Mode.SUBTRACT)


with BuildPart() as f4_tool46:
    # F4_s47 → F4_t48 (new body)
    with BuildSketch(Plane.XY.offset(53.975)):
        with Locations((-13.49375, -50.00625)):
            Rectangle(F4_S47_W, F4_S47_H)
    extrude(amount=F4_T48_DEPTH)

    # F4_s49 → F4_t50 (revolve, cut)
    with BuildSketch(Plane(origin=(-14.2875, -49.2125, 53.975), x_dir=(-0.7071067812, 0.7071067812, 0), z_dir=(0.7071067812, 0.7071067812, 0))):
        with BuildLine():
            ThreePointArc((0, -1.5875), (1.5875, 0), (0, 1.5875))
            Line((0, 1.5875), (0, -1.5875))
        make_face()
    revolve(axis=Axis((-14.2875, -49.2125, 53.975), (0, 0, 1)), mode=Mode.SUBTRACT)


with BuildPart() as f1_8:
    add(f1_7.part)

    # F4_t45: cut F4_tool46
    add(f4_tool46.part, mode=Mode.SUBTRACT)


solid = f1_8.part
